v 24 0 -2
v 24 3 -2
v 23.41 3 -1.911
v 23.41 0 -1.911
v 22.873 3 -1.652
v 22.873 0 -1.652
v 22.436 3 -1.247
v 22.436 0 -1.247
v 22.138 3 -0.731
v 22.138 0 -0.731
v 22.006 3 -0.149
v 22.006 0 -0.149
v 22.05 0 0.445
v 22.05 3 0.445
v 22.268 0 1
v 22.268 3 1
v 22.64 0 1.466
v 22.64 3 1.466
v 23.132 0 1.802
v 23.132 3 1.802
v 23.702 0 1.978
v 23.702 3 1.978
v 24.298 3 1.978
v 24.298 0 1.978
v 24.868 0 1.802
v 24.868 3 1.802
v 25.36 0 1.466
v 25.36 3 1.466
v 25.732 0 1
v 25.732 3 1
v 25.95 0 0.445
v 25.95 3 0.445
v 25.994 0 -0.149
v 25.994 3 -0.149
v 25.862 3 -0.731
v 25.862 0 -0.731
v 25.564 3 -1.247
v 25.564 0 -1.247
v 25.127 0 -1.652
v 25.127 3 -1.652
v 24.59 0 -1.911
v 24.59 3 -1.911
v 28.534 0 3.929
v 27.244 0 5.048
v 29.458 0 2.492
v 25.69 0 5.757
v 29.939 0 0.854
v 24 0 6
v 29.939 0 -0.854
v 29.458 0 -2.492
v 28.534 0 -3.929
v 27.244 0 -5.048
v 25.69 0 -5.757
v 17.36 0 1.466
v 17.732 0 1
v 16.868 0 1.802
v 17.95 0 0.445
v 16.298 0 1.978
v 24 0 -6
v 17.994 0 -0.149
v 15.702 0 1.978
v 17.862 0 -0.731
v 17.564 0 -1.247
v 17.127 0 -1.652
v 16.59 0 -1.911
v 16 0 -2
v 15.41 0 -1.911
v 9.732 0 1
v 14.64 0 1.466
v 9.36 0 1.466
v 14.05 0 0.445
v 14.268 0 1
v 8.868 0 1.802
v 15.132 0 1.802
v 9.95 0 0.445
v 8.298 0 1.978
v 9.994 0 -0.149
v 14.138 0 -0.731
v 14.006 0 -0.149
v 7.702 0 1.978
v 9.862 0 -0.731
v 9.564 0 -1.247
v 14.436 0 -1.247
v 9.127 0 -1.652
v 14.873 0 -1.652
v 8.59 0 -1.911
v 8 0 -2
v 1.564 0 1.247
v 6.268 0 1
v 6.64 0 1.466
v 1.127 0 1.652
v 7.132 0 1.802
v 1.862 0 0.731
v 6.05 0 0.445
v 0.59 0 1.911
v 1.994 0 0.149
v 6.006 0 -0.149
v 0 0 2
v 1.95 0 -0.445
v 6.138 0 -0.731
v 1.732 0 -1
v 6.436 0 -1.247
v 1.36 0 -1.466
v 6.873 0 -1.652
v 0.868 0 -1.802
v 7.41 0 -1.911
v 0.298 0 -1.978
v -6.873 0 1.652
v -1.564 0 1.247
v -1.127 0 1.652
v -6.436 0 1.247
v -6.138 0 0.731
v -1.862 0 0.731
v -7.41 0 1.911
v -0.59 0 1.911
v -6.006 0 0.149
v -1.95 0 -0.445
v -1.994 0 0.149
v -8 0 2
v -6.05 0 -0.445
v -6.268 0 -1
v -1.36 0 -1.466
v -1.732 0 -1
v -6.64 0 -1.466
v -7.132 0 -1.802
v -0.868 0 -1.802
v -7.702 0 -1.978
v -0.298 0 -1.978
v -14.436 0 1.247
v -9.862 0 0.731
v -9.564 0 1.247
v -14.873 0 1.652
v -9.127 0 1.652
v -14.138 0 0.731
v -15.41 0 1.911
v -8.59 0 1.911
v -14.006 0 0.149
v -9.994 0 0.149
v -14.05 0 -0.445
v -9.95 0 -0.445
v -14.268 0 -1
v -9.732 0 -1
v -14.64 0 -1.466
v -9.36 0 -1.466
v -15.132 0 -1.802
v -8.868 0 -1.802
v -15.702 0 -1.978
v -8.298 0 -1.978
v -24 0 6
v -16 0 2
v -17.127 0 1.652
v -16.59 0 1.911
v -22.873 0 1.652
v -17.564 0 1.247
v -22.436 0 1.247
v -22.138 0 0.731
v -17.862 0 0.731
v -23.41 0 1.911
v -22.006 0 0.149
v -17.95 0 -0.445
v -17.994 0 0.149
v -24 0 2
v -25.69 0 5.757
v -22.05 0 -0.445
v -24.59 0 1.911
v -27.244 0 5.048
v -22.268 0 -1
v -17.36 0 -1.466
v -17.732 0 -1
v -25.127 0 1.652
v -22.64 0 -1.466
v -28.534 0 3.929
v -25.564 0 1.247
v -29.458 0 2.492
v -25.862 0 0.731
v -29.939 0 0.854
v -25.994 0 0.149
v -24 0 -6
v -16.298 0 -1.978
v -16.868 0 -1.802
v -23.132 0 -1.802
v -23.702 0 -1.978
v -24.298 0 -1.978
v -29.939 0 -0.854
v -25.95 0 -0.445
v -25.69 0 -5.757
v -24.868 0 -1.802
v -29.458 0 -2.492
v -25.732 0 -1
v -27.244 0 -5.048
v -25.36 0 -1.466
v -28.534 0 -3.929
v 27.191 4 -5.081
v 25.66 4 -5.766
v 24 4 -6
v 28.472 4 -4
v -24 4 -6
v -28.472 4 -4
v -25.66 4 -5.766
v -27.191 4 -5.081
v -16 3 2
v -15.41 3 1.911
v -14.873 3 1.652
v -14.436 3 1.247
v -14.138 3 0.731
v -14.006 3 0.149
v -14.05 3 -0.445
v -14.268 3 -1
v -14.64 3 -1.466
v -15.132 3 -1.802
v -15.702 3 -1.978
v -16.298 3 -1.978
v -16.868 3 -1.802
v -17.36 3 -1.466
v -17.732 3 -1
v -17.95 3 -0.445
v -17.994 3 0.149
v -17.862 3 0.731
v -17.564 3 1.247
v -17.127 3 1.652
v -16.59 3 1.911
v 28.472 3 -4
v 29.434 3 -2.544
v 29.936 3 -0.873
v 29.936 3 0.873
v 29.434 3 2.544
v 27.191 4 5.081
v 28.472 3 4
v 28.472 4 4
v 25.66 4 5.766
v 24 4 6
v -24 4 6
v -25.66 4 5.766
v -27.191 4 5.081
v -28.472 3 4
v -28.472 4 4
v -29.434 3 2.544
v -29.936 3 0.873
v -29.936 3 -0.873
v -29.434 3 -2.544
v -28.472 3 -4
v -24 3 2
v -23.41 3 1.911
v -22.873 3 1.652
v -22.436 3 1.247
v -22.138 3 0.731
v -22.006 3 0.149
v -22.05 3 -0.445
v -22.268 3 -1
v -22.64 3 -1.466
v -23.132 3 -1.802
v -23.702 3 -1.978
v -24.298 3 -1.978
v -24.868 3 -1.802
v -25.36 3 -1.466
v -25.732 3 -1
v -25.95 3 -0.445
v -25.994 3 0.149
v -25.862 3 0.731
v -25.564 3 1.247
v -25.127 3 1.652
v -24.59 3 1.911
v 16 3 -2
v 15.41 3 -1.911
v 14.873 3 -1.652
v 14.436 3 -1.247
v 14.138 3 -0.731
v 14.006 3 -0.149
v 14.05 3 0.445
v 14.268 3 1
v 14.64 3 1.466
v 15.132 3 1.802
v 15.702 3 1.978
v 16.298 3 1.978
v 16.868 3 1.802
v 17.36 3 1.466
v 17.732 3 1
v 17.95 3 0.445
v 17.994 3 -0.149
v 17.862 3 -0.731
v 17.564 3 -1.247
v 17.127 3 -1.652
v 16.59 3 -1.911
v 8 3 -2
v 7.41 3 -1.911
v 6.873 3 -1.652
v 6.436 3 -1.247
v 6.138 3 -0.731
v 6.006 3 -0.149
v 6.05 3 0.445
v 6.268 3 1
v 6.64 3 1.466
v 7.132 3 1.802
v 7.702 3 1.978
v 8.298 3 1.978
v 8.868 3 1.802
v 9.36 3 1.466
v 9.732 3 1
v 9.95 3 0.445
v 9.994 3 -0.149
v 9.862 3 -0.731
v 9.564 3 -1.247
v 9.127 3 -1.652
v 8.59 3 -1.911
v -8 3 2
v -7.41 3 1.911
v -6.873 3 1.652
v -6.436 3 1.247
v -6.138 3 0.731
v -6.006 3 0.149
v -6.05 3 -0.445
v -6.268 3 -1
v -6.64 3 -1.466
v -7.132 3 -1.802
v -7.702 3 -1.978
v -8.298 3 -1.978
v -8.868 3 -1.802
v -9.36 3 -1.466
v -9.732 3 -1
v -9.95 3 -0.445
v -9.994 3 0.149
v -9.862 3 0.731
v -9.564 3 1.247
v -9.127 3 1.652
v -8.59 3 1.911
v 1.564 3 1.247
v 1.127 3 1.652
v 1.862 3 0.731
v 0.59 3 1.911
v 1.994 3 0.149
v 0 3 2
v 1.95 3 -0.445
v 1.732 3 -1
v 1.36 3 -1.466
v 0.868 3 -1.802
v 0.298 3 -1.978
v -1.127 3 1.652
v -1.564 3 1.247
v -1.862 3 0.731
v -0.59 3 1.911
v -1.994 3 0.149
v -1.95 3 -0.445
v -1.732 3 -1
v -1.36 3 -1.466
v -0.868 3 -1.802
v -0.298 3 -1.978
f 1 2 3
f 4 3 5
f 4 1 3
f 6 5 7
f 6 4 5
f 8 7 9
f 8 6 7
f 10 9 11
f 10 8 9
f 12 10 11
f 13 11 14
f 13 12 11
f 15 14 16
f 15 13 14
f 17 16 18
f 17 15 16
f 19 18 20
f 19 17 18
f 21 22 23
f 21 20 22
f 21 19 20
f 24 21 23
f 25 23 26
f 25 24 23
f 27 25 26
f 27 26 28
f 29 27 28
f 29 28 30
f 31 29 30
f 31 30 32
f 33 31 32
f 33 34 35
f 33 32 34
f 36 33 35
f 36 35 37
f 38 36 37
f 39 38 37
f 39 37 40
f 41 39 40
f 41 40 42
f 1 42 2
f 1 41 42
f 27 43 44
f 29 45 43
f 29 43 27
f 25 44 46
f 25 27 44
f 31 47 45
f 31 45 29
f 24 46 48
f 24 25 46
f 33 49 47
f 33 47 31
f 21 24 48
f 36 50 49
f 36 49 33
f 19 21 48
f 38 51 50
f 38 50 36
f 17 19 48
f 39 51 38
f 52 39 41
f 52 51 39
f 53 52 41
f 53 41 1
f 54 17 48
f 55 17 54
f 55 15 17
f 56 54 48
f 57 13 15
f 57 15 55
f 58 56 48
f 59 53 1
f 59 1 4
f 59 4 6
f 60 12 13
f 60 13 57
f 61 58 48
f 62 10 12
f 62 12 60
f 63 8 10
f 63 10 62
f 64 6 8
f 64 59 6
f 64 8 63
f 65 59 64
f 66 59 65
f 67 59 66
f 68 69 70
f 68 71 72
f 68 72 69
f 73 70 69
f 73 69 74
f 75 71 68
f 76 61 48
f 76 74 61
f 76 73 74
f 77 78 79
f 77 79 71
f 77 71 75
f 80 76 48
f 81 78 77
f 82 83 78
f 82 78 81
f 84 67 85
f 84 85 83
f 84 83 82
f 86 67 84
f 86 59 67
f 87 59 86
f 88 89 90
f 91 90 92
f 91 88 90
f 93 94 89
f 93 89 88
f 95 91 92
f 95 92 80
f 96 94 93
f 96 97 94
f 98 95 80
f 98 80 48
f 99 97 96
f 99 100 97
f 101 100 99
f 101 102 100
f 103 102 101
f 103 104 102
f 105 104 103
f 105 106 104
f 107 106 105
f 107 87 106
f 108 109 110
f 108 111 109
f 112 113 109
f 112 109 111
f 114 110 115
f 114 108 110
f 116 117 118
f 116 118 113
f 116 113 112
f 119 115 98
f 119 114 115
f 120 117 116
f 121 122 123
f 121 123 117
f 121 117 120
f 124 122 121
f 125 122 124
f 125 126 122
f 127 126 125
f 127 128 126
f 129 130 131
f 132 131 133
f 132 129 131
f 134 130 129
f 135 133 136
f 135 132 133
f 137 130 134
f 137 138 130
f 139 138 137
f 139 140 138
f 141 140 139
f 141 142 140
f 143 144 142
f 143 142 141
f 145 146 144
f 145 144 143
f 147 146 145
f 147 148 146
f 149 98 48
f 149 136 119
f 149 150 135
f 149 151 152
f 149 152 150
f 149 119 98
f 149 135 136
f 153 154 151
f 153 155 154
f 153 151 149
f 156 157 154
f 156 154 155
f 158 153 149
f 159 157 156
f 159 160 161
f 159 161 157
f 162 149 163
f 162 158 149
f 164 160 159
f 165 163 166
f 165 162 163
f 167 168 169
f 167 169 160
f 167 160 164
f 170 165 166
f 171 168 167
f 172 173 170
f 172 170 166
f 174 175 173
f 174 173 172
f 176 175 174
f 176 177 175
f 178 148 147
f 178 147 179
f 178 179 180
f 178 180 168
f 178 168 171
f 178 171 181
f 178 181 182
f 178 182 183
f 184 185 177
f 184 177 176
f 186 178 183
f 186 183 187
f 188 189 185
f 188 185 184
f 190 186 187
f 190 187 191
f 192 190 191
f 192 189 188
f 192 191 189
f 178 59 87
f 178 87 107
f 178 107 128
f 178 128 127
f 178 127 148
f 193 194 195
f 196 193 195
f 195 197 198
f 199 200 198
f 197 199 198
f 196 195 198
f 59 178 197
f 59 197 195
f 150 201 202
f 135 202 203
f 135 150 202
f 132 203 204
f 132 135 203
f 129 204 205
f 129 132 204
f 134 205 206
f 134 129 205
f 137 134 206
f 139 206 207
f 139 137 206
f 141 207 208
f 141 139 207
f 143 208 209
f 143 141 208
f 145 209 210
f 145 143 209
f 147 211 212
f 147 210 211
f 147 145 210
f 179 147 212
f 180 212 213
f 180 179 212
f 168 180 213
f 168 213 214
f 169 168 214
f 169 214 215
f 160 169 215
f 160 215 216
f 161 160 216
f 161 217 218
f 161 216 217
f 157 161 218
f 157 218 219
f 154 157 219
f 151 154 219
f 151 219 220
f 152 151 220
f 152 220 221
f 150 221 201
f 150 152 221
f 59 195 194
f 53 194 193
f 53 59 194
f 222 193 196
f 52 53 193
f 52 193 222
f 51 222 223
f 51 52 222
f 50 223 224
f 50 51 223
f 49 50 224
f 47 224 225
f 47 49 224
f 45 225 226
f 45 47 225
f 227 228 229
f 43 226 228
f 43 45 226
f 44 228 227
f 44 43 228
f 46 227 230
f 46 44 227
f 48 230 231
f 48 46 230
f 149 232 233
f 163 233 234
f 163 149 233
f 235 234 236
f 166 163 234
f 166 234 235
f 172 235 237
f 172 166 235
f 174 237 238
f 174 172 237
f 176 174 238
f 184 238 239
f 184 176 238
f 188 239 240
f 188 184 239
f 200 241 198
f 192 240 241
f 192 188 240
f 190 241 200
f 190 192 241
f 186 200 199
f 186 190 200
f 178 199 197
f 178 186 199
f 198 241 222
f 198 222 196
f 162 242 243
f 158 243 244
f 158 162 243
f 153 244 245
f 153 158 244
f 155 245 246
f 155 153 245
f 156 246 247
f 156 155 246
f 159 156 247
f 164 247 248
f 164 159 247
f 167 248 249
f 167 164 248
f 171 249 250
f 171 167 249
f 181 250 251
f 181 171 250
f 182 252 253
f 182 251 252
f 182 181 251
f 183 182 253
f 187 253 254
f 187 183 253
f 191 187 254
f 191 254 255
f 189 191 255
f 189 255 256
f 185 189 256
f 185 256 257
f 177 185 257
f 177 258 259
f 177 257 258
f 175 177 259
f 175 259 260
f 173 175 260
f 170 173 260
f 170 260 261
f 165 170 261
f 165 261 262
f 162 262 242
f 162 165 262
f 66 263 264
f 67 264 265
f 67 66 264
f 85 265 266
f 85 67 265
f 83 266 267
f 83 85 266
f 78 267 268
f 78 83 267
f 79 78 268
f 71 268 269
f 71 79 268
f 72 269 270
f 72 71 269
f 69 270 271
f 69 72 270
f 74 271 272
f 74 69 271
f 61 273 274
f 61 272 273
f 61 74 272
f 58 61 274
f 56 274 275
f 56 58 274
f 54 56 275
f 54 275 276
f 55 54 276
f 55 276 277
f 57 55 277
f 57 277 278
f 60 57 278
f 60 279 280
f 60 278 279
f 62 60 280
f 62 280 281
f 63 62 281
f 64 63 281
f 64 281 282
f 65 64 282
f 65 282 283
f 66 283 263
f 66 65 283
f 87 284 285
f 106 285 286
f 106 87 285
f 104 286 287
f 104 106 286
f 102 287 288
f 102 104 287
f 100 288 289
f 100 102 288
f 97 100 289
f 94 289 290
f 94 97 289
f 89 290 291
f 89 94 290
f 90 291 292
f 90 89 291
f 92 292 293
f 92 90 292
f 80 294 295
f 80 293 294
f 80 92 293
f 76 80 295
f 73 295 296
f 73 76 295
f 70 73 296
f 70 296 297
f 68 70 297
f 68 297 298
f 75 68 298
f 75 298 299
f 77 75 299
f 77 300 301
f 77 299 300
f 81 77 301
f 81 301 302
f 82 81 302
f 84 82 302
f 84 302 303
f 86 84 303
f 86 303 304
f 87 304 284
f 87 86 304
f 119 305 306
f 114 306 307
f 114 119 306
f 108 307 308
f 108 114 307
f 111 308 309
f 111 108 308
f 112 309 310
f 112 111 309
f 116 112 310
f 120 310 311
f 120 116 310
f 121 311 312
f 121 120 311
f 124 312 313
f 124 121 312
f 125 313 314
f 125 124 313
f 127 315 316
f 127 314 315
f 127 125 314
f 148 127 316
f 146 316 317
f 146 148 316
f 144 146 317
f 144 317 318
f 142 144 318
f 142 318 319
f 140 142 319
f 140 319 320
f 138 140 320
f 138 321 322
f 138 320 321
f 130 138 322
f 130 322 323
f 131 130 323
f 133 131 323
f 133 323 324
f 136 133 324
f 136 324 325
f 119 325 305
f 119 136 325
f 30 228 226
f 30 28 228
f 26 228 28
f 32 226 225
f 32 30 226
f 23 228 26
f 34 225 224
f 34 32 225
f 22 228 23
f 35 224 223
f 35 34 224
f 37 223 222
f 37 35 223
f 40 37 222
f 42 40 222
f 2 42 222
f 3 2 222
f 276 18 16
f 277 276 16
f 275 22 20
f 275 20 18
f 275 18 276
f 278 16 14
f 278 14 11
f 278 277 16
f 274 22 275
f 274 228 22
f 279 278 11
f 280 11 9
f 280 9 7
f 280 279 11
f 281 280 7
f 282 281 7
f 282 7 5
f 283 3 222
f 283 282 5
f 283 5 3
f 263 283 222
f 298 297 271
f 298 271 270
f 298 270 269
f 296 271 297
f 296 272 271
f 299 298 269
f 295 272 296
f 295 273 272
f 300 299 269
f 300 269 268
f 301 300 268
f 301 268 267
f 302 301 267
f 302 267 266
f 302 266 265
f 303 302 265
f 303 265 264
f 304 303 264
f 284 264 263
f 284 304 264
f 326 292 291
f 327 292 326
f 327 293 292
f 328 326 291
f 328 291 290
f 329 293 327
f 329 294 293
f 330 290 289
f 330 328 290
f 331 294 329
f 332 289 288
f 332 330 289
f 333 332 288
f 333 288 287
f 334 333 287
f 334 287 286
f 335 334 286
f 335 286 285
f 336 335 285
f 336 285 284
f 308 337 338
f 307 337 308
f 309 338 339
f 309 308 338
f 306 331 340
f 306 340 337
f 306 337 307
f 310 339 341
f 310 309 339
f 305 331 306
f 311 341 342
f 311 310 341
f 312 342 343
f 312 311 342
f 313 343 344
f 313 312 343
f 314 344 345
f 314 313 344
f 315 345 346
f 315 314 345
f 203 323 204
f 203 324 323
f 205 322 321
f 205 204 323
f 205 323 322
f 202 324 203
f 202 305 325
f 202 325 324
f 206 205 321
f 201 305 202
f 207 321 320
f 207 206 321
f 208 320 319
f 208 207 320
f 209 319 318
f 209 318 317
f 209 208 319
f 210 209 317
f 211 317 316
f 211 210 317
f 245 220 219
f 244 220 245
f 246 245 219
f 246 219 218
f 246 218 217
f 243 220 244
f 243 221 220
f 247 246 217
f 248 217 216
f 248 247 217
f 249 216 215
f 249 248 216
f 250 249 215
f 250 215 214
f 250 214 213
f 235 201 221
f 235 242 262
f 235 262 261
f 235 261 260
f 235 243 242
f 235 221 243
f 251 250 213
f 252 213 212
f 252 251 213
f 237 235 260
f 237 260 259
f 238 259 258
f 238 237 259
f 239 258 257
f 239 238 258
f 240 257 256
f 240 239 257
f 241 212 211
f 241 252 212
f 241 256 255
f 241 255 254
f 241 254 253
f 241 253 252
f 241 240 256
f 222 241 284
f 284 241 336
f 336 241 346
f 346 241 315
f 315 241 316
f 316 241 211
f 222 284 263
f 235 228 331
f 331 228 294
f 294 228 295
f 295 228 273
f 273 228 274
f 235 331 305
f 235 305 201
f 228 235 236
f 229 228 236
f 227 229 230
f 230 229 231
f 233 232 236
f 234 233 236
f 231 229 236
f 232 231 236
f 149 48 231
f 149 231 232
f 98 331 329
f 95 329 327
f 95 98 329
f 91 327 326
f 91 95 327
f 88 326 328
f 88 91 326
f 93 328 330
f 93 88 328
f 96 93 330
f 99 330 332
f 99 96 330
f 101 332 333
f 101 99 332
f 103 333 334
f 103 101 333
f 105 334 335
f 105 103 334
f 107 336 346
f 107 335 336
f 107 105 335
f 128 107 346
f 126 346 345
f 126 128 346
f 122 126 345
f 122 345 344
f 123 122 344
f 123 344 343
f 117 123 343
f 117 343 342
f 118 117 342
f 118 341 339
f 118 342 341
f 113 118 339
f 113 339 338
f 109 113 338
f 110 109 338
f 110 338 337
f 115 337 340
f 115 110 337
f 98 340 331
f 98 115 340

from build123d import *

# Parameters (mm, degrees)
SKETCH1_R           = 2
BOSS_EXTRUDE1_DEPTH = 4
SKETCH2_W           = 8
SKETCH2_H           = 1
CUT_EXTRUDE1_DEPTH  = 32
SKETCH2_2_W         = 8
SKETCH2_2_H         = 1
CUT_EXTRUDE2_DEPTH  = 35


with BuildPart() as part:
    # Sketch1 → Boss-Extrude1 (new body)
    with BuildSketch(Plane(origin=(0, 0, 0), x_dir=(1, 0, 0), z_dir=(0, 1, 0))):
        with BuildLine():
            Line((24, -6), (-24, -6))
            ThreePointArc((-24, -6), (-30, 0), (-24, 6))
            Line((-24, 6), (24, 6))
            ThreePointArc((24, 6), (30, 0), (24, -6))
        make_face()
        with Locations((-24, 0)):
            Circle(SKETCH1_R, mode=Mode.SUBTRACT)
        with Locations((-16, 0)):
            Circle(SKETCH1_R, mode=Mode.SUBTRACT)
        with Locations((-8, 0)):
            Circle(SKETCH1_R, mode=Mode.SUBTRACT)
        Circle(SKETCH1_R, mode=Mode.SUBTRACT)
        with Locations((8, 0)):
            Circle(SKETCH1_R, mode=Mode.SUBTRACT)
        with Locations((16, 0)):
            Circle(SKETCH1_R, mode=Mode.SUBTRACT)
        with Locations((24, 0)):
            Circle(SKETCH1_R, mode=Mode.SUBTRACT)
    extrude(amount=BOSS_EXTRUDE1_DEPTH)

    # Sketch2 → Cut-Extrude1 (cut)
    with BuildSketch(Plane(origin=(0, 0, 0), x_dir=(0, 0, -1), z_dir=(1, 0, 0))):
        with Locations((0, 3.5)):
            Rectangle(SKETCH2_W, SKETCH2_H)
    extrude(amount=-CUT_EXTRUDE1_DEPTH, mode=Mode.SUBTRACT)

    # Sketch2<2> → Cut-Extrude2 (cut)
    with BuildSketch(Plane(origin=(0, 0, 0), x_dir=(0, 0, -1), z_dir=(1, 0, 0))):
        with Locations((0, 3.5)):
            Rectangle(SKETCH2_2_W, SKETCH2_2_H)
    extrude(amount=CUT_EXTRUDE2_DEPTH, mode=Mode.SUBTRACT)


solid = part.part
